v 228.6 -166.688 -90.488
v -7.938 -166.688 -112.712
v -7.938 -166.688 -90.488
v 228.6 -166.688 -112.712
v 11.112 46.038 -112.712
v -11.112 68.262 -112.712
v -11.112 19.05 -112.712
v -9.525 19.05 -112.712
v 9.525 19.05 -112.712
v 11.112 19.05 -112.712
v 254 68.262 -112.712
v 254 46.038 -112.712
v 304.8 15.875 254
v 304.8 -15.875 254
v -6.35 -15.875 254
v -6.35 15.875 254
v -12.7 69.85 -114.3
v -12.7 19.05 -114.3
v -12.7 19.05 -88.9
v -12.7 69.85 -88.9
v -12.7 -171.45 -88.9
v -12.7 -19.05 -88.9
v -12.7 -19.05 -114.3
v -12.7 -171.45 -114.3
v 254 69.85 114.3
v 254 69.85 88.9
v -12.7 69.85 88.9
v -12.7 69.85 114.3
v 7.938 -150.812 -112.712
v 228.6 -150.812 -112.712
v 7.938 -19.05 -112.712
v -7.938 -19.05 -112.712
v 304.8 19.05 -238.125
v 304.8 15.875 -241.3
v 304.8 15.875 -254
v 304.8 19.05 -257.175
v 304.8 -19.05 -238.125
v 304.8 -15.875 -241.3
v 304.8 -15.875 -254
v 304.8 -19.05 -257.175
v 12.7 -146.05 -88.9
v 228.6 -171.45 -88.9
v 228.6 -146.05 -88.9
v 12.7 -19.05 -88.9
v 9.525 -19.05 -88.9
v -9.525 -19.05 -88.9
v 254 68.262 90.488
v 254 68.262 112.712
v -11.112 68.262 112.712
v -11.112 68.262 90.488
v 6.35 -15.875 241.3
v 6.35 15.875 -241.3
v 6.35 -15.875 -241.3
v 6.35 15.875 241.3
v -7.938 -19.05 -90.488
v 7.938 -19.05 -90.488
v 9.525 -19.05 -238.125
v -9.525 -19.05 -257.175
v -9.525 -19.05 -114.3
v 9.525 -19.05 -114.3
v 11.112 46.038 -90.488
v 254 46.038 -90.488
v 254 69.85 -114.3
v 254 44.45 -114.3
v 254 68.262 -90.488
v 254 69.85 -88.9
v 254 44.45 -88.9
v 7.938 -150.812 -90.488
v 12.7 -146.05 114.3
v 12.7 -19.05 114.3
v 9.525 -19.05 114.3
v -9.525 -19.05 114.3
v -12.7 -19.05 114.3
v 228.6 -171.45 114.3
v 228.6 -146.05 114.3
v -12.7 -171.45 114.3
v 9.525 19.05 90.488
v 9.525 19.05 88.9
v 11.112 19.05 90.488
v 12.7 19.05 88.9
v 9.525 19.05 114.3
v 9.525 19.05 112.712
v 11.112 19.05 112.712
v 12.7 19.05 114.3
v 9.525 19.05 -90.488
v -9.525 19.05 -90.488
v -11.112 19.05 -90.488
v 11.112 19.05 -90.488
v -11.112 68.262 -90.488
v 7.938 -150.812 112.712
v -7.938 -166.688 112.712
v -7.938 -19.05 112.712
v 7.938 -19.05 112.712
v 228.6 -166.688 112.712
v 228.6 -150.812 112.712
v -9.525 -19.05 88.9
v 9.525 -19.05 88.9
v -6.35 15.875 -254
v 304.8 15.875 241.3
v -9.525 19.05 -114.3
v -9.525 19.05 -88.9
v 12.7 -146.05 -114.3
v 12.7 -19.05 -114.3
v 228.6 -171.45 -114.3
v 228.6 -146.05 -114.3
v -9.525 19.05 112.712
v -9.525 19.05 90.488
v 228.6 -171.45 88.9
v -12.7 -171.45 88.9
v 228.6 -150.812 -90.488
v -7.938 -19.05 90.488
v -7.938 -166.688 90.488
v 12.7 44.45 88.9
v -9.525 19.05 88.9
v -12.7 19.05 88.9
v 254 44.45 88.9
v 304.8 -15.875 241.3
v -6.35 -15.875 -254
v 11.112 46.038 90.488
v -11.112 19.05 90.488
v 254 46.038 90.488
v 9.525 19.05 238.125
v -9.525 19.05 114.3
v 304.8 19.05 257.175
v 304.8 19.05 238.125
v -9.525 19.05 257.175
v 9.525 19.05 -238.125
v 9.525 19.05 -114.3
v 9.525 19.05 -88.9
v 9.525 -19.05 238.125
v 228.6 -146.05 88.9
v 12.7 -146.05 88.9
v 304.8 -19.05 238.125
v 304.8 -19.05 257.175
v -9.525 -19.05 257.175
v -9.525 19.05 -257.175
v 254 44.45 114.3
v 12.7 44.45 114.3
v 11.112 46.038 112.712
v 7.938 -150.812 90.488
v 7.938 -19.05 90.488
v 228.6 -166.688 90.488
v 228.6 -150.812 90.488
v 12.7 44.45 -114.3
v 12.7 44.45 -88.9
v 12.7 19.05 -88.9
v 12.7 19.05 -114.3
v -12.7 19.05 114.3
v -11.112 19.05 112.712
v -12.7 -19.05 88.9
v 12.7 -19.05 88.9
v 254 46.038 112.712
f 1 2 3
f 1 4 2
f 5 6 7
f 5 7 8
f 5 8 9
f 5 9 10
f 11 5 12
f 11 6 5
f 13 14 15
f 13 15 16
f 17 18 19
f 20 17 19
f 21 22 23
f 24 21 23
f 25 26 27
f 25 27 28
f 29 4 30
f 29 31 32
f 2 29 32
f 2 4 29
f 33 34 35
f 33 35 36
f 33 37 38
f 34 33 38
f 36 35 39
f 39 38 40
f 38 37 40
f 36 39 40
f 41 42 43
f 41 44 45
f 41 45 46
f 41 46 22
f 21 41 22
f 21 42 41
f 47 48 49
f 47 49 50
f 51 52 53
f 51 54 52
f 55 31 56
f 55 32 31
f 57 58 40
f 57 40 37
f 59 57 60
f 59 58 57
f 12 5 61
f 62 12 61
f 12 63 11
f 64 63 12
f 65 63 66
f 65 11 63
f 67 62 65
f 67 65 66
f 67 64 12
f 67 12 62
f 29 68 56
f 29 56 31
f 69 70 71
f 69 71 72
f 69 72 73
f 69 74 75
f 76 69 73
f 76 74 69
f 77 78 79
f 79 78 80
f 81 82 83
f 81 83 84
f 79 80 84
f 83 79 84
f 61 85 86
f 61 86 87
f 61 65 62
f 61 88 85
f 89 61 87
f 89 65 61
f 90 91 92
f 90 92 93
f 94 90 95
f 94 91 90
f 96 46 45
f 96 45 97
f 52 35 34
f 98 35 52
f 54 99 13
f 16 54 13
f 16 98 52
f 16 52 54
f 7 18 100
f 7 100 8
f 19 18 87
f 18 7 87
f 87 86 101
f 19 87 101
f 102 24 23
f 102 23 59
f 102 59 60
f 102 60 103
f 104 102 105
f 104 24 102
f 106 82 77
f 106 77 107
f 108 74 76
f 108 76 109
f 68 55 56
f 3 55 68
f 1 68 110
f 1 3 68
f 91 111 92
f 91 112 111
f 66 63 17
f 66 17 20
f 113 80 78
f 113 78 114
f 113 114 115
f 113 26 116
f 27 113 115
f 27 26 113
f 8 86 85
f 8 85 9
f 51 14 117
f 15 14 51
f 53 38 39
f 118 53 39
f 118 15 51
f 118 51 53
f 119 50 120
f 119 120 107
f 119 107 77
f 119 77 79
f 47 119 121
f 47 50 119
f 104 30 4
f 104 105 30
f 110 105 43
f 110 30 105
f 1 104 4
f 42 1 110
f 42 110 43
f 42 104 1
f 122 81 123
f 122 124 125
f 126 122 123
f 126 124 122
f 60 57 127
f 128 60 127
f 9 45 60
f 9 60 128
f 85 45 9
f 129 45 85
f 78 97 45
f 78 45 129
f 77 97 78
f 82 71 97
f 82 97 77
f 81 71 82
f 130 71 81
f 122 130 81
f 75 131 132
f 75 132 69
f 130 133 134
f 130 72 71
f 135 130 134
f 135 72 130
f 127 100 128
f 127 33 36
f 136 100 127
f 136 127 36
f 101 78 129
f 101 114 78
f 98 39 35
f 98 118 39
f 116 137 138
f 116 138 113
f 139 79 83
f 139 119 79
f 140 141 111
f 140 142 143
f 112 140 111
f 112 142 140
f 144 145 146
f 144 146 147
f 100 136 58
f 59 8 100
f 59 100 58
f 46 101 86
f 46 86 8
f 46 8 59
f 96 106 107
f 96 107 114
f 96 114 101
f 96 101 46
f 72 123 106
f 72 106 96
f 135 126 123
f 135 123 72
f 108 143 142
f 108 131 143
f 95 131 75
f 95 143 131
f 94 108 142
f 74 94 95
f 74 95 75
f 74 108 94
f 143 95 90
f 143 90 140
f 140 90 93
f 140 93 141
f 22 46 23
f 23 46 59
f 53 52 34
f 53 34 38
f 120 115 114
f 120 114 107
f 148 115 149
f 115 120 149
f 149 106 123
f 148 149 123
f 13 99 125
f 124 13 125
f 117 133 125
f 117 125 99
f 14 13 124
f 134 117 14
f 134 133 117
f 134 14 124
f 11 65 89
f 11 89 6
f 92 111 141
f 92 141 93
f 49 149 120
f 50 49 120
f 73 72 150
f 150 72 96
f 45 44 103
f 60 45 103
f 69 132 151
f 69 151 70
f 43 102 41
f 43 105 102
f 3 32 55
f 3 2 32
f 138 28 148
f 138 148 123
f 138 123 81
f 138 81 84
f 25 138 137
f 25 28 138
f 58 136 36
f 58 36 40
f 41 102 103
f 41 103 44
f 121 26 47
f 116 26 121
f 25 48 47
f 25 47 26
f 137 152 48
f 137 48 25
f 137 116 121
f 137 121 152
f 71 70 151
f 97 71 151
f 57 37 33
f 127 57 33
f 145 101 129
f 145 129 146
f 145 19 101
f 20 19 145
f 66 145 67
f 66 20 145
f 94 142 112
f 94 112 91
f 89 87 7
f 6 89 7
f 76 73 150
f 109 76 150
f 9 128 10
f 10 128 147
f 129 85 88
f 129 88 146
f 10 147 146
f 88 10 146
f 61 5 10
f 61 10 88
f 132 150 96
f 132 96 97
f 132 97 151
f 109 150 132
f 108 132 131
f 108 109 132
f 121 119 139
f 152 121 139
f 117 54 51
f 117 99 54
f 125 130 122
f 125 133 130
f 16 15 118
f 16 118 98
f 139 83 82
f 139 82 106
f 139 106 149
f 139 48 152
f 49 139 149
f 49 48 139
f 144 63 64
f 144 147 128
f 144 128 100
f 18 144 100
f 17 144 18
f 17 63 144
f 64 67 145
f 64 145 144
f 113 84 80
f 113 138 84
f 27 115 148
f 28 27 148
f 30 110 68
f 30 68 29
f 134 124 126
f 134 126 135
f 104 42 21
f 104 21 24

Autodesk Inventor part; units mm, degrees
sketch "Sketch10" plane through (0, 0, 0) normal (0, 1, 0) x (-1, 0, 0)
  line L0 (0, 0) -> (0, 247.65)
  line L1 (0, 247.65) -> (-304.8, 247.65)
  line L2 (0, 0) -> (-304.8, 0) construction
  line L3 (0, 0) -> (0, -247.65)
  line L4 (0, -247.65) -> (-304.8, -247.65)
  dimension "d31" = 247.65
  dimension "d32" = 304.8
ref_plane "Work Plane2" through (304.8, 0, 0) normal (1, 0, 0) x (0, 1, 0)
sketch "Sketch11" plane through (304.8, 0, 0) normal (1, 0, 0) x (0, 1, 0)
  line L0 (-19.05, 257.175) -> (-19.05, 238.125)
  line L1 (-19.05, 238.125) -> (19.05, 238.125)
  line L2 (19.05, 238.125) -> (19.05, 257.175)
  line L3 (19.05, 257.175) -> (-19.05, 257.175)
  line L4 (-19.05, 257.175) -> (19.05, 238.125) construction
  line L5 (-19.05, 238.125) -> (19.05, 257.175) construction
  line L6 (-15.875, 254) -> (-15.875, 241.3)
  line L7 (-15.875, 241.3) -> (15.875, 241.3)
  line L8 (15.875, 241.3) -> (15.875, 254)
  line L9 (15.875, 254) -> (-15.875, 254)
  line L10 (-15.875, 254) -> (15.875, 241.3) construction
  line L11 (-15.875, 241.3) -> (15.875, 254) construction
  point P0 (0, 0)
  point P1 (0, 247.65)
  dimension "d34" = 247.65
  dimension "d35" = 19.05
  dimension "d36" = 38.1
  dimension "d37" = 3.175
  dimension "d38" = 3.175
sweep "Sweep5" add profiles "Sketch11" path "Sketch10"
sketch "Sketch12" plane through (304.8, 19.05, 257.175) normal (0, 1, 0) x (1, 0, 0)
  line L0 (-304.8, 257.175) -> (-304.8, 0) construction
  line L1 (0, 0) -> (-314.325, 0) construction
  line L2 (-317.5, 142.875) -> (-292.1, 142.875)
  line L3 (-292.1, 142.875) -> (-292.1, 168.275)
  line L4 (-292.1, 168.275) -> (-317.5, 168.275)
  line L5 (-317.5, 168.275) -> (-317.5, 142.875)
  line L6 (-317.5, 142.875) -> (-292.1, 168.275) construction
  line L7 (-292.1, 142.875) -> (-317.5, 168.275) construction
  line L8 (-298.45, 15.875) -> (-298.45, 498.475) projected
  line L9 (-315.9125, 144.4625) -> (-293.6875, 144.4625)
  line L10 (-293.6875, 144.4625) -> (-293.6875, 166.6875)
  line L11 (-293.6875, 166.6875) -> (-315.9125, 166.6875)
  line L12 (-315.9125, 166.6875) -> (-315.9125, 144.4625)
  line L13 (-315.9125, 144.4625) -> (-293.6875, 166.6875) construction
  line L14 (-293.6875, 144.4625) -> (-315.9125, 166.6875) construction
  point P0 (-304.8, 155.575)
  dimension "d41" = 25.4
  dimension "d42" = 25.4
  dimension "d43" = 101.6
  dimension "d44" = 1.5875
  dimension "d45" = 1.5875
ref_plane "Work Plane3" through (0, 0, 38.1) normal (0, 0, 1) x (1, 0, 0)
sketch "Sketch13" plane through (0, 0, 38.1) normal (0, 0, 1) x (1, 0, 0)
  line L0 (304.8, 19.05) -> (-9.525, 19.05) projected
  line L1 (0, 19.05) -> (0, 57.15)
  line L2 (0, 57.15) -> (254, 57.15)
  point P0 (0, 0)
  dimension "d47" = 254
  dimension "d48" = 38.1
sweep "Sweep6" add profiles "Sketch12" path "Sketch13" path curves L1 L2 contours L5 L4 L8 L11 L12 L9 L2 | L8 L9 L10 L11 L4 L3 L2
mirror "Mirror2" about plane through (0, 0, 0) normal (0, 0, 1) of "Sweep6"
sketch "Sketch14" plane through (304.8, -19.05, 238.125) normal (0, -1, 0) x (1, 0, 0)
  line L0 (-304.8, -238.125) -> (-304.8, 15.875) construction
  line L1 (0, 15.875) -> (-311.15, 15.875) construction
  line L2 (-317.5, -123.825) -> (-317.5, -149.225)
  line L3 (-317.5, -149.225) -> (-292.1, -149.225)
  line L4 (-292.1, -149.225) -> (-292.1, -123.825)
  line L5 (-292.1, -123.825) -> (-317.5, -123.825)
  line L6 (-317.5, -123.825) -> (-292.1, -149.225) construction
  line L7 (-317.5, -149.225) -> (-292.1, -123.825) construction
  line L8 (-312.7375, -125.4125) -> (-312.7375, -147.6375)
  line L9 (-312.7375, -147.6375) -> (-296.8625, -147.6375)
  line L10 (-296.8625, -147.6375) -> (-296.8625, -125.4125)
  line L11 (-296.8625, -125.4125) -> (-312.7375, -125.4125)
  line L12 (-312.7375, -125.4125) -> (-296.8625, -147.6375) construction
  line L13 (-312.7375, -147.6375) -> (-296.8625, -125.4125) construction
  line L14 (-314.325, 19.05) -> (-314.325, -495.3) projected
  point P0 (-304.8, -136.525)
  dimension "d52" = 101.6
  dimension "d53" = 25.4
  dimension "d54" = 25.4
  dimension "d55" = 1.5875
  dimension "d56" = 1.5875
ref_plane "Work Plane5" through (0, 0, 101.6) normal (0, 0, 1) x (1, 0, 0)
sketch "Sketch15" plane through (0, 0, 101.6) normal (0, 0, 1) x (1, 0, 0)
  line L0 (-9.525, -19.05) -> (304.8, -19.05) projected
  line L1 (0, -19.05) -> (0, -158.75)
  line L2 (0, -158.75) -> (228.6, -158.75)
  point P0 (0, 0)
  dimension "d58" = 228.6
  dimension "d59" = 139.7
sweep "Sweep7" add profiles "Sketch14" path "Sketch15" path curves L1 L2
mirror "Mirror5" about plane through (0, 0, 0) normal (0, 0, 1) of "Sweep7"
ref_plane "Work Plane6" through (152.4, 0, 0) normal (1, 0, 0) x (0, 1, 0)
equation "\"d31\" = halfOfWidth"
equation "\"d32\" = length"
equation "\"d34\" = halfOfWidth"
equation "\"d35\" = largeTubingWidth"
equation "\"d36\" = largeTubingHeight"
equation "\"d37\" = largeTubeThickness"
equation "\"d38\" = largeTubeThickness"
equation "\"d41\" = smallSupportTubeWidth"
equation "\"d42\" = smallSupportTubeWidth"
equation "\"d43\" = distaceToMiddleSmallSupportTube"
equation "\"d44\" = smallSupportTubeThickness"
equation "\"d45\" = smallSupportTubeThickness"
equation "\"d47\" = topSupportTubeExtension"
equation "\"d48\" = smallSupportTubeLength"
equation "\"d52\" = distaceToMiddleSmallSupportTube"
equation "\"d53\" = smallSupportTubeWidth"
equation "\"d54\" = smallSupportTubeHeight"
equation "\"d55\" = smallSupportTubeThickness"
equation "\"d56\" = smallSupportTubeThickness"
equation "\"d58\" = bottomSupportTubeExtension"
equation "\"halfOfWidth\" = 0.5 * width"
equation "\"length\" = 304.8"
equation "\"height\" = 241.3"
equation "\"largeTubingWidth\" = 19.05"
equation "\"largeTubingHeight\" = 38.1"
equation "\"largeTubeThickness\" = 3.175"
equation "\"d33\" = length"
equation "\"width\" = 495.3"
equation "\"smallSupportTubeWidth\" = 25.4"
equation "\"smallSupportTubeHeight\" = 25.4"
equation "\"smallSupportTubeThickness\" = 1.5875"
equation "\"distaceToMiddleSmallSupportTube\" = 101.6"
equation "\"smallSupportTubeLength\" = 38.1"
equation "\"d46\" = smallSupportTubeLength"
equation "\"d57\" = distaceToMiddleSmallSupportTube"
equation "\"distanceOriginToPlaneForSupportTubes\" = 152.4"
equation "\"d62\" = distanceOriginToPlaneForSupportTubes"
equation "\"topSupportTubeExtension\" = 254"
equation "\"bottomSupportTubeExtension\" = 228.6"
properties part number "ShooterFrame"
